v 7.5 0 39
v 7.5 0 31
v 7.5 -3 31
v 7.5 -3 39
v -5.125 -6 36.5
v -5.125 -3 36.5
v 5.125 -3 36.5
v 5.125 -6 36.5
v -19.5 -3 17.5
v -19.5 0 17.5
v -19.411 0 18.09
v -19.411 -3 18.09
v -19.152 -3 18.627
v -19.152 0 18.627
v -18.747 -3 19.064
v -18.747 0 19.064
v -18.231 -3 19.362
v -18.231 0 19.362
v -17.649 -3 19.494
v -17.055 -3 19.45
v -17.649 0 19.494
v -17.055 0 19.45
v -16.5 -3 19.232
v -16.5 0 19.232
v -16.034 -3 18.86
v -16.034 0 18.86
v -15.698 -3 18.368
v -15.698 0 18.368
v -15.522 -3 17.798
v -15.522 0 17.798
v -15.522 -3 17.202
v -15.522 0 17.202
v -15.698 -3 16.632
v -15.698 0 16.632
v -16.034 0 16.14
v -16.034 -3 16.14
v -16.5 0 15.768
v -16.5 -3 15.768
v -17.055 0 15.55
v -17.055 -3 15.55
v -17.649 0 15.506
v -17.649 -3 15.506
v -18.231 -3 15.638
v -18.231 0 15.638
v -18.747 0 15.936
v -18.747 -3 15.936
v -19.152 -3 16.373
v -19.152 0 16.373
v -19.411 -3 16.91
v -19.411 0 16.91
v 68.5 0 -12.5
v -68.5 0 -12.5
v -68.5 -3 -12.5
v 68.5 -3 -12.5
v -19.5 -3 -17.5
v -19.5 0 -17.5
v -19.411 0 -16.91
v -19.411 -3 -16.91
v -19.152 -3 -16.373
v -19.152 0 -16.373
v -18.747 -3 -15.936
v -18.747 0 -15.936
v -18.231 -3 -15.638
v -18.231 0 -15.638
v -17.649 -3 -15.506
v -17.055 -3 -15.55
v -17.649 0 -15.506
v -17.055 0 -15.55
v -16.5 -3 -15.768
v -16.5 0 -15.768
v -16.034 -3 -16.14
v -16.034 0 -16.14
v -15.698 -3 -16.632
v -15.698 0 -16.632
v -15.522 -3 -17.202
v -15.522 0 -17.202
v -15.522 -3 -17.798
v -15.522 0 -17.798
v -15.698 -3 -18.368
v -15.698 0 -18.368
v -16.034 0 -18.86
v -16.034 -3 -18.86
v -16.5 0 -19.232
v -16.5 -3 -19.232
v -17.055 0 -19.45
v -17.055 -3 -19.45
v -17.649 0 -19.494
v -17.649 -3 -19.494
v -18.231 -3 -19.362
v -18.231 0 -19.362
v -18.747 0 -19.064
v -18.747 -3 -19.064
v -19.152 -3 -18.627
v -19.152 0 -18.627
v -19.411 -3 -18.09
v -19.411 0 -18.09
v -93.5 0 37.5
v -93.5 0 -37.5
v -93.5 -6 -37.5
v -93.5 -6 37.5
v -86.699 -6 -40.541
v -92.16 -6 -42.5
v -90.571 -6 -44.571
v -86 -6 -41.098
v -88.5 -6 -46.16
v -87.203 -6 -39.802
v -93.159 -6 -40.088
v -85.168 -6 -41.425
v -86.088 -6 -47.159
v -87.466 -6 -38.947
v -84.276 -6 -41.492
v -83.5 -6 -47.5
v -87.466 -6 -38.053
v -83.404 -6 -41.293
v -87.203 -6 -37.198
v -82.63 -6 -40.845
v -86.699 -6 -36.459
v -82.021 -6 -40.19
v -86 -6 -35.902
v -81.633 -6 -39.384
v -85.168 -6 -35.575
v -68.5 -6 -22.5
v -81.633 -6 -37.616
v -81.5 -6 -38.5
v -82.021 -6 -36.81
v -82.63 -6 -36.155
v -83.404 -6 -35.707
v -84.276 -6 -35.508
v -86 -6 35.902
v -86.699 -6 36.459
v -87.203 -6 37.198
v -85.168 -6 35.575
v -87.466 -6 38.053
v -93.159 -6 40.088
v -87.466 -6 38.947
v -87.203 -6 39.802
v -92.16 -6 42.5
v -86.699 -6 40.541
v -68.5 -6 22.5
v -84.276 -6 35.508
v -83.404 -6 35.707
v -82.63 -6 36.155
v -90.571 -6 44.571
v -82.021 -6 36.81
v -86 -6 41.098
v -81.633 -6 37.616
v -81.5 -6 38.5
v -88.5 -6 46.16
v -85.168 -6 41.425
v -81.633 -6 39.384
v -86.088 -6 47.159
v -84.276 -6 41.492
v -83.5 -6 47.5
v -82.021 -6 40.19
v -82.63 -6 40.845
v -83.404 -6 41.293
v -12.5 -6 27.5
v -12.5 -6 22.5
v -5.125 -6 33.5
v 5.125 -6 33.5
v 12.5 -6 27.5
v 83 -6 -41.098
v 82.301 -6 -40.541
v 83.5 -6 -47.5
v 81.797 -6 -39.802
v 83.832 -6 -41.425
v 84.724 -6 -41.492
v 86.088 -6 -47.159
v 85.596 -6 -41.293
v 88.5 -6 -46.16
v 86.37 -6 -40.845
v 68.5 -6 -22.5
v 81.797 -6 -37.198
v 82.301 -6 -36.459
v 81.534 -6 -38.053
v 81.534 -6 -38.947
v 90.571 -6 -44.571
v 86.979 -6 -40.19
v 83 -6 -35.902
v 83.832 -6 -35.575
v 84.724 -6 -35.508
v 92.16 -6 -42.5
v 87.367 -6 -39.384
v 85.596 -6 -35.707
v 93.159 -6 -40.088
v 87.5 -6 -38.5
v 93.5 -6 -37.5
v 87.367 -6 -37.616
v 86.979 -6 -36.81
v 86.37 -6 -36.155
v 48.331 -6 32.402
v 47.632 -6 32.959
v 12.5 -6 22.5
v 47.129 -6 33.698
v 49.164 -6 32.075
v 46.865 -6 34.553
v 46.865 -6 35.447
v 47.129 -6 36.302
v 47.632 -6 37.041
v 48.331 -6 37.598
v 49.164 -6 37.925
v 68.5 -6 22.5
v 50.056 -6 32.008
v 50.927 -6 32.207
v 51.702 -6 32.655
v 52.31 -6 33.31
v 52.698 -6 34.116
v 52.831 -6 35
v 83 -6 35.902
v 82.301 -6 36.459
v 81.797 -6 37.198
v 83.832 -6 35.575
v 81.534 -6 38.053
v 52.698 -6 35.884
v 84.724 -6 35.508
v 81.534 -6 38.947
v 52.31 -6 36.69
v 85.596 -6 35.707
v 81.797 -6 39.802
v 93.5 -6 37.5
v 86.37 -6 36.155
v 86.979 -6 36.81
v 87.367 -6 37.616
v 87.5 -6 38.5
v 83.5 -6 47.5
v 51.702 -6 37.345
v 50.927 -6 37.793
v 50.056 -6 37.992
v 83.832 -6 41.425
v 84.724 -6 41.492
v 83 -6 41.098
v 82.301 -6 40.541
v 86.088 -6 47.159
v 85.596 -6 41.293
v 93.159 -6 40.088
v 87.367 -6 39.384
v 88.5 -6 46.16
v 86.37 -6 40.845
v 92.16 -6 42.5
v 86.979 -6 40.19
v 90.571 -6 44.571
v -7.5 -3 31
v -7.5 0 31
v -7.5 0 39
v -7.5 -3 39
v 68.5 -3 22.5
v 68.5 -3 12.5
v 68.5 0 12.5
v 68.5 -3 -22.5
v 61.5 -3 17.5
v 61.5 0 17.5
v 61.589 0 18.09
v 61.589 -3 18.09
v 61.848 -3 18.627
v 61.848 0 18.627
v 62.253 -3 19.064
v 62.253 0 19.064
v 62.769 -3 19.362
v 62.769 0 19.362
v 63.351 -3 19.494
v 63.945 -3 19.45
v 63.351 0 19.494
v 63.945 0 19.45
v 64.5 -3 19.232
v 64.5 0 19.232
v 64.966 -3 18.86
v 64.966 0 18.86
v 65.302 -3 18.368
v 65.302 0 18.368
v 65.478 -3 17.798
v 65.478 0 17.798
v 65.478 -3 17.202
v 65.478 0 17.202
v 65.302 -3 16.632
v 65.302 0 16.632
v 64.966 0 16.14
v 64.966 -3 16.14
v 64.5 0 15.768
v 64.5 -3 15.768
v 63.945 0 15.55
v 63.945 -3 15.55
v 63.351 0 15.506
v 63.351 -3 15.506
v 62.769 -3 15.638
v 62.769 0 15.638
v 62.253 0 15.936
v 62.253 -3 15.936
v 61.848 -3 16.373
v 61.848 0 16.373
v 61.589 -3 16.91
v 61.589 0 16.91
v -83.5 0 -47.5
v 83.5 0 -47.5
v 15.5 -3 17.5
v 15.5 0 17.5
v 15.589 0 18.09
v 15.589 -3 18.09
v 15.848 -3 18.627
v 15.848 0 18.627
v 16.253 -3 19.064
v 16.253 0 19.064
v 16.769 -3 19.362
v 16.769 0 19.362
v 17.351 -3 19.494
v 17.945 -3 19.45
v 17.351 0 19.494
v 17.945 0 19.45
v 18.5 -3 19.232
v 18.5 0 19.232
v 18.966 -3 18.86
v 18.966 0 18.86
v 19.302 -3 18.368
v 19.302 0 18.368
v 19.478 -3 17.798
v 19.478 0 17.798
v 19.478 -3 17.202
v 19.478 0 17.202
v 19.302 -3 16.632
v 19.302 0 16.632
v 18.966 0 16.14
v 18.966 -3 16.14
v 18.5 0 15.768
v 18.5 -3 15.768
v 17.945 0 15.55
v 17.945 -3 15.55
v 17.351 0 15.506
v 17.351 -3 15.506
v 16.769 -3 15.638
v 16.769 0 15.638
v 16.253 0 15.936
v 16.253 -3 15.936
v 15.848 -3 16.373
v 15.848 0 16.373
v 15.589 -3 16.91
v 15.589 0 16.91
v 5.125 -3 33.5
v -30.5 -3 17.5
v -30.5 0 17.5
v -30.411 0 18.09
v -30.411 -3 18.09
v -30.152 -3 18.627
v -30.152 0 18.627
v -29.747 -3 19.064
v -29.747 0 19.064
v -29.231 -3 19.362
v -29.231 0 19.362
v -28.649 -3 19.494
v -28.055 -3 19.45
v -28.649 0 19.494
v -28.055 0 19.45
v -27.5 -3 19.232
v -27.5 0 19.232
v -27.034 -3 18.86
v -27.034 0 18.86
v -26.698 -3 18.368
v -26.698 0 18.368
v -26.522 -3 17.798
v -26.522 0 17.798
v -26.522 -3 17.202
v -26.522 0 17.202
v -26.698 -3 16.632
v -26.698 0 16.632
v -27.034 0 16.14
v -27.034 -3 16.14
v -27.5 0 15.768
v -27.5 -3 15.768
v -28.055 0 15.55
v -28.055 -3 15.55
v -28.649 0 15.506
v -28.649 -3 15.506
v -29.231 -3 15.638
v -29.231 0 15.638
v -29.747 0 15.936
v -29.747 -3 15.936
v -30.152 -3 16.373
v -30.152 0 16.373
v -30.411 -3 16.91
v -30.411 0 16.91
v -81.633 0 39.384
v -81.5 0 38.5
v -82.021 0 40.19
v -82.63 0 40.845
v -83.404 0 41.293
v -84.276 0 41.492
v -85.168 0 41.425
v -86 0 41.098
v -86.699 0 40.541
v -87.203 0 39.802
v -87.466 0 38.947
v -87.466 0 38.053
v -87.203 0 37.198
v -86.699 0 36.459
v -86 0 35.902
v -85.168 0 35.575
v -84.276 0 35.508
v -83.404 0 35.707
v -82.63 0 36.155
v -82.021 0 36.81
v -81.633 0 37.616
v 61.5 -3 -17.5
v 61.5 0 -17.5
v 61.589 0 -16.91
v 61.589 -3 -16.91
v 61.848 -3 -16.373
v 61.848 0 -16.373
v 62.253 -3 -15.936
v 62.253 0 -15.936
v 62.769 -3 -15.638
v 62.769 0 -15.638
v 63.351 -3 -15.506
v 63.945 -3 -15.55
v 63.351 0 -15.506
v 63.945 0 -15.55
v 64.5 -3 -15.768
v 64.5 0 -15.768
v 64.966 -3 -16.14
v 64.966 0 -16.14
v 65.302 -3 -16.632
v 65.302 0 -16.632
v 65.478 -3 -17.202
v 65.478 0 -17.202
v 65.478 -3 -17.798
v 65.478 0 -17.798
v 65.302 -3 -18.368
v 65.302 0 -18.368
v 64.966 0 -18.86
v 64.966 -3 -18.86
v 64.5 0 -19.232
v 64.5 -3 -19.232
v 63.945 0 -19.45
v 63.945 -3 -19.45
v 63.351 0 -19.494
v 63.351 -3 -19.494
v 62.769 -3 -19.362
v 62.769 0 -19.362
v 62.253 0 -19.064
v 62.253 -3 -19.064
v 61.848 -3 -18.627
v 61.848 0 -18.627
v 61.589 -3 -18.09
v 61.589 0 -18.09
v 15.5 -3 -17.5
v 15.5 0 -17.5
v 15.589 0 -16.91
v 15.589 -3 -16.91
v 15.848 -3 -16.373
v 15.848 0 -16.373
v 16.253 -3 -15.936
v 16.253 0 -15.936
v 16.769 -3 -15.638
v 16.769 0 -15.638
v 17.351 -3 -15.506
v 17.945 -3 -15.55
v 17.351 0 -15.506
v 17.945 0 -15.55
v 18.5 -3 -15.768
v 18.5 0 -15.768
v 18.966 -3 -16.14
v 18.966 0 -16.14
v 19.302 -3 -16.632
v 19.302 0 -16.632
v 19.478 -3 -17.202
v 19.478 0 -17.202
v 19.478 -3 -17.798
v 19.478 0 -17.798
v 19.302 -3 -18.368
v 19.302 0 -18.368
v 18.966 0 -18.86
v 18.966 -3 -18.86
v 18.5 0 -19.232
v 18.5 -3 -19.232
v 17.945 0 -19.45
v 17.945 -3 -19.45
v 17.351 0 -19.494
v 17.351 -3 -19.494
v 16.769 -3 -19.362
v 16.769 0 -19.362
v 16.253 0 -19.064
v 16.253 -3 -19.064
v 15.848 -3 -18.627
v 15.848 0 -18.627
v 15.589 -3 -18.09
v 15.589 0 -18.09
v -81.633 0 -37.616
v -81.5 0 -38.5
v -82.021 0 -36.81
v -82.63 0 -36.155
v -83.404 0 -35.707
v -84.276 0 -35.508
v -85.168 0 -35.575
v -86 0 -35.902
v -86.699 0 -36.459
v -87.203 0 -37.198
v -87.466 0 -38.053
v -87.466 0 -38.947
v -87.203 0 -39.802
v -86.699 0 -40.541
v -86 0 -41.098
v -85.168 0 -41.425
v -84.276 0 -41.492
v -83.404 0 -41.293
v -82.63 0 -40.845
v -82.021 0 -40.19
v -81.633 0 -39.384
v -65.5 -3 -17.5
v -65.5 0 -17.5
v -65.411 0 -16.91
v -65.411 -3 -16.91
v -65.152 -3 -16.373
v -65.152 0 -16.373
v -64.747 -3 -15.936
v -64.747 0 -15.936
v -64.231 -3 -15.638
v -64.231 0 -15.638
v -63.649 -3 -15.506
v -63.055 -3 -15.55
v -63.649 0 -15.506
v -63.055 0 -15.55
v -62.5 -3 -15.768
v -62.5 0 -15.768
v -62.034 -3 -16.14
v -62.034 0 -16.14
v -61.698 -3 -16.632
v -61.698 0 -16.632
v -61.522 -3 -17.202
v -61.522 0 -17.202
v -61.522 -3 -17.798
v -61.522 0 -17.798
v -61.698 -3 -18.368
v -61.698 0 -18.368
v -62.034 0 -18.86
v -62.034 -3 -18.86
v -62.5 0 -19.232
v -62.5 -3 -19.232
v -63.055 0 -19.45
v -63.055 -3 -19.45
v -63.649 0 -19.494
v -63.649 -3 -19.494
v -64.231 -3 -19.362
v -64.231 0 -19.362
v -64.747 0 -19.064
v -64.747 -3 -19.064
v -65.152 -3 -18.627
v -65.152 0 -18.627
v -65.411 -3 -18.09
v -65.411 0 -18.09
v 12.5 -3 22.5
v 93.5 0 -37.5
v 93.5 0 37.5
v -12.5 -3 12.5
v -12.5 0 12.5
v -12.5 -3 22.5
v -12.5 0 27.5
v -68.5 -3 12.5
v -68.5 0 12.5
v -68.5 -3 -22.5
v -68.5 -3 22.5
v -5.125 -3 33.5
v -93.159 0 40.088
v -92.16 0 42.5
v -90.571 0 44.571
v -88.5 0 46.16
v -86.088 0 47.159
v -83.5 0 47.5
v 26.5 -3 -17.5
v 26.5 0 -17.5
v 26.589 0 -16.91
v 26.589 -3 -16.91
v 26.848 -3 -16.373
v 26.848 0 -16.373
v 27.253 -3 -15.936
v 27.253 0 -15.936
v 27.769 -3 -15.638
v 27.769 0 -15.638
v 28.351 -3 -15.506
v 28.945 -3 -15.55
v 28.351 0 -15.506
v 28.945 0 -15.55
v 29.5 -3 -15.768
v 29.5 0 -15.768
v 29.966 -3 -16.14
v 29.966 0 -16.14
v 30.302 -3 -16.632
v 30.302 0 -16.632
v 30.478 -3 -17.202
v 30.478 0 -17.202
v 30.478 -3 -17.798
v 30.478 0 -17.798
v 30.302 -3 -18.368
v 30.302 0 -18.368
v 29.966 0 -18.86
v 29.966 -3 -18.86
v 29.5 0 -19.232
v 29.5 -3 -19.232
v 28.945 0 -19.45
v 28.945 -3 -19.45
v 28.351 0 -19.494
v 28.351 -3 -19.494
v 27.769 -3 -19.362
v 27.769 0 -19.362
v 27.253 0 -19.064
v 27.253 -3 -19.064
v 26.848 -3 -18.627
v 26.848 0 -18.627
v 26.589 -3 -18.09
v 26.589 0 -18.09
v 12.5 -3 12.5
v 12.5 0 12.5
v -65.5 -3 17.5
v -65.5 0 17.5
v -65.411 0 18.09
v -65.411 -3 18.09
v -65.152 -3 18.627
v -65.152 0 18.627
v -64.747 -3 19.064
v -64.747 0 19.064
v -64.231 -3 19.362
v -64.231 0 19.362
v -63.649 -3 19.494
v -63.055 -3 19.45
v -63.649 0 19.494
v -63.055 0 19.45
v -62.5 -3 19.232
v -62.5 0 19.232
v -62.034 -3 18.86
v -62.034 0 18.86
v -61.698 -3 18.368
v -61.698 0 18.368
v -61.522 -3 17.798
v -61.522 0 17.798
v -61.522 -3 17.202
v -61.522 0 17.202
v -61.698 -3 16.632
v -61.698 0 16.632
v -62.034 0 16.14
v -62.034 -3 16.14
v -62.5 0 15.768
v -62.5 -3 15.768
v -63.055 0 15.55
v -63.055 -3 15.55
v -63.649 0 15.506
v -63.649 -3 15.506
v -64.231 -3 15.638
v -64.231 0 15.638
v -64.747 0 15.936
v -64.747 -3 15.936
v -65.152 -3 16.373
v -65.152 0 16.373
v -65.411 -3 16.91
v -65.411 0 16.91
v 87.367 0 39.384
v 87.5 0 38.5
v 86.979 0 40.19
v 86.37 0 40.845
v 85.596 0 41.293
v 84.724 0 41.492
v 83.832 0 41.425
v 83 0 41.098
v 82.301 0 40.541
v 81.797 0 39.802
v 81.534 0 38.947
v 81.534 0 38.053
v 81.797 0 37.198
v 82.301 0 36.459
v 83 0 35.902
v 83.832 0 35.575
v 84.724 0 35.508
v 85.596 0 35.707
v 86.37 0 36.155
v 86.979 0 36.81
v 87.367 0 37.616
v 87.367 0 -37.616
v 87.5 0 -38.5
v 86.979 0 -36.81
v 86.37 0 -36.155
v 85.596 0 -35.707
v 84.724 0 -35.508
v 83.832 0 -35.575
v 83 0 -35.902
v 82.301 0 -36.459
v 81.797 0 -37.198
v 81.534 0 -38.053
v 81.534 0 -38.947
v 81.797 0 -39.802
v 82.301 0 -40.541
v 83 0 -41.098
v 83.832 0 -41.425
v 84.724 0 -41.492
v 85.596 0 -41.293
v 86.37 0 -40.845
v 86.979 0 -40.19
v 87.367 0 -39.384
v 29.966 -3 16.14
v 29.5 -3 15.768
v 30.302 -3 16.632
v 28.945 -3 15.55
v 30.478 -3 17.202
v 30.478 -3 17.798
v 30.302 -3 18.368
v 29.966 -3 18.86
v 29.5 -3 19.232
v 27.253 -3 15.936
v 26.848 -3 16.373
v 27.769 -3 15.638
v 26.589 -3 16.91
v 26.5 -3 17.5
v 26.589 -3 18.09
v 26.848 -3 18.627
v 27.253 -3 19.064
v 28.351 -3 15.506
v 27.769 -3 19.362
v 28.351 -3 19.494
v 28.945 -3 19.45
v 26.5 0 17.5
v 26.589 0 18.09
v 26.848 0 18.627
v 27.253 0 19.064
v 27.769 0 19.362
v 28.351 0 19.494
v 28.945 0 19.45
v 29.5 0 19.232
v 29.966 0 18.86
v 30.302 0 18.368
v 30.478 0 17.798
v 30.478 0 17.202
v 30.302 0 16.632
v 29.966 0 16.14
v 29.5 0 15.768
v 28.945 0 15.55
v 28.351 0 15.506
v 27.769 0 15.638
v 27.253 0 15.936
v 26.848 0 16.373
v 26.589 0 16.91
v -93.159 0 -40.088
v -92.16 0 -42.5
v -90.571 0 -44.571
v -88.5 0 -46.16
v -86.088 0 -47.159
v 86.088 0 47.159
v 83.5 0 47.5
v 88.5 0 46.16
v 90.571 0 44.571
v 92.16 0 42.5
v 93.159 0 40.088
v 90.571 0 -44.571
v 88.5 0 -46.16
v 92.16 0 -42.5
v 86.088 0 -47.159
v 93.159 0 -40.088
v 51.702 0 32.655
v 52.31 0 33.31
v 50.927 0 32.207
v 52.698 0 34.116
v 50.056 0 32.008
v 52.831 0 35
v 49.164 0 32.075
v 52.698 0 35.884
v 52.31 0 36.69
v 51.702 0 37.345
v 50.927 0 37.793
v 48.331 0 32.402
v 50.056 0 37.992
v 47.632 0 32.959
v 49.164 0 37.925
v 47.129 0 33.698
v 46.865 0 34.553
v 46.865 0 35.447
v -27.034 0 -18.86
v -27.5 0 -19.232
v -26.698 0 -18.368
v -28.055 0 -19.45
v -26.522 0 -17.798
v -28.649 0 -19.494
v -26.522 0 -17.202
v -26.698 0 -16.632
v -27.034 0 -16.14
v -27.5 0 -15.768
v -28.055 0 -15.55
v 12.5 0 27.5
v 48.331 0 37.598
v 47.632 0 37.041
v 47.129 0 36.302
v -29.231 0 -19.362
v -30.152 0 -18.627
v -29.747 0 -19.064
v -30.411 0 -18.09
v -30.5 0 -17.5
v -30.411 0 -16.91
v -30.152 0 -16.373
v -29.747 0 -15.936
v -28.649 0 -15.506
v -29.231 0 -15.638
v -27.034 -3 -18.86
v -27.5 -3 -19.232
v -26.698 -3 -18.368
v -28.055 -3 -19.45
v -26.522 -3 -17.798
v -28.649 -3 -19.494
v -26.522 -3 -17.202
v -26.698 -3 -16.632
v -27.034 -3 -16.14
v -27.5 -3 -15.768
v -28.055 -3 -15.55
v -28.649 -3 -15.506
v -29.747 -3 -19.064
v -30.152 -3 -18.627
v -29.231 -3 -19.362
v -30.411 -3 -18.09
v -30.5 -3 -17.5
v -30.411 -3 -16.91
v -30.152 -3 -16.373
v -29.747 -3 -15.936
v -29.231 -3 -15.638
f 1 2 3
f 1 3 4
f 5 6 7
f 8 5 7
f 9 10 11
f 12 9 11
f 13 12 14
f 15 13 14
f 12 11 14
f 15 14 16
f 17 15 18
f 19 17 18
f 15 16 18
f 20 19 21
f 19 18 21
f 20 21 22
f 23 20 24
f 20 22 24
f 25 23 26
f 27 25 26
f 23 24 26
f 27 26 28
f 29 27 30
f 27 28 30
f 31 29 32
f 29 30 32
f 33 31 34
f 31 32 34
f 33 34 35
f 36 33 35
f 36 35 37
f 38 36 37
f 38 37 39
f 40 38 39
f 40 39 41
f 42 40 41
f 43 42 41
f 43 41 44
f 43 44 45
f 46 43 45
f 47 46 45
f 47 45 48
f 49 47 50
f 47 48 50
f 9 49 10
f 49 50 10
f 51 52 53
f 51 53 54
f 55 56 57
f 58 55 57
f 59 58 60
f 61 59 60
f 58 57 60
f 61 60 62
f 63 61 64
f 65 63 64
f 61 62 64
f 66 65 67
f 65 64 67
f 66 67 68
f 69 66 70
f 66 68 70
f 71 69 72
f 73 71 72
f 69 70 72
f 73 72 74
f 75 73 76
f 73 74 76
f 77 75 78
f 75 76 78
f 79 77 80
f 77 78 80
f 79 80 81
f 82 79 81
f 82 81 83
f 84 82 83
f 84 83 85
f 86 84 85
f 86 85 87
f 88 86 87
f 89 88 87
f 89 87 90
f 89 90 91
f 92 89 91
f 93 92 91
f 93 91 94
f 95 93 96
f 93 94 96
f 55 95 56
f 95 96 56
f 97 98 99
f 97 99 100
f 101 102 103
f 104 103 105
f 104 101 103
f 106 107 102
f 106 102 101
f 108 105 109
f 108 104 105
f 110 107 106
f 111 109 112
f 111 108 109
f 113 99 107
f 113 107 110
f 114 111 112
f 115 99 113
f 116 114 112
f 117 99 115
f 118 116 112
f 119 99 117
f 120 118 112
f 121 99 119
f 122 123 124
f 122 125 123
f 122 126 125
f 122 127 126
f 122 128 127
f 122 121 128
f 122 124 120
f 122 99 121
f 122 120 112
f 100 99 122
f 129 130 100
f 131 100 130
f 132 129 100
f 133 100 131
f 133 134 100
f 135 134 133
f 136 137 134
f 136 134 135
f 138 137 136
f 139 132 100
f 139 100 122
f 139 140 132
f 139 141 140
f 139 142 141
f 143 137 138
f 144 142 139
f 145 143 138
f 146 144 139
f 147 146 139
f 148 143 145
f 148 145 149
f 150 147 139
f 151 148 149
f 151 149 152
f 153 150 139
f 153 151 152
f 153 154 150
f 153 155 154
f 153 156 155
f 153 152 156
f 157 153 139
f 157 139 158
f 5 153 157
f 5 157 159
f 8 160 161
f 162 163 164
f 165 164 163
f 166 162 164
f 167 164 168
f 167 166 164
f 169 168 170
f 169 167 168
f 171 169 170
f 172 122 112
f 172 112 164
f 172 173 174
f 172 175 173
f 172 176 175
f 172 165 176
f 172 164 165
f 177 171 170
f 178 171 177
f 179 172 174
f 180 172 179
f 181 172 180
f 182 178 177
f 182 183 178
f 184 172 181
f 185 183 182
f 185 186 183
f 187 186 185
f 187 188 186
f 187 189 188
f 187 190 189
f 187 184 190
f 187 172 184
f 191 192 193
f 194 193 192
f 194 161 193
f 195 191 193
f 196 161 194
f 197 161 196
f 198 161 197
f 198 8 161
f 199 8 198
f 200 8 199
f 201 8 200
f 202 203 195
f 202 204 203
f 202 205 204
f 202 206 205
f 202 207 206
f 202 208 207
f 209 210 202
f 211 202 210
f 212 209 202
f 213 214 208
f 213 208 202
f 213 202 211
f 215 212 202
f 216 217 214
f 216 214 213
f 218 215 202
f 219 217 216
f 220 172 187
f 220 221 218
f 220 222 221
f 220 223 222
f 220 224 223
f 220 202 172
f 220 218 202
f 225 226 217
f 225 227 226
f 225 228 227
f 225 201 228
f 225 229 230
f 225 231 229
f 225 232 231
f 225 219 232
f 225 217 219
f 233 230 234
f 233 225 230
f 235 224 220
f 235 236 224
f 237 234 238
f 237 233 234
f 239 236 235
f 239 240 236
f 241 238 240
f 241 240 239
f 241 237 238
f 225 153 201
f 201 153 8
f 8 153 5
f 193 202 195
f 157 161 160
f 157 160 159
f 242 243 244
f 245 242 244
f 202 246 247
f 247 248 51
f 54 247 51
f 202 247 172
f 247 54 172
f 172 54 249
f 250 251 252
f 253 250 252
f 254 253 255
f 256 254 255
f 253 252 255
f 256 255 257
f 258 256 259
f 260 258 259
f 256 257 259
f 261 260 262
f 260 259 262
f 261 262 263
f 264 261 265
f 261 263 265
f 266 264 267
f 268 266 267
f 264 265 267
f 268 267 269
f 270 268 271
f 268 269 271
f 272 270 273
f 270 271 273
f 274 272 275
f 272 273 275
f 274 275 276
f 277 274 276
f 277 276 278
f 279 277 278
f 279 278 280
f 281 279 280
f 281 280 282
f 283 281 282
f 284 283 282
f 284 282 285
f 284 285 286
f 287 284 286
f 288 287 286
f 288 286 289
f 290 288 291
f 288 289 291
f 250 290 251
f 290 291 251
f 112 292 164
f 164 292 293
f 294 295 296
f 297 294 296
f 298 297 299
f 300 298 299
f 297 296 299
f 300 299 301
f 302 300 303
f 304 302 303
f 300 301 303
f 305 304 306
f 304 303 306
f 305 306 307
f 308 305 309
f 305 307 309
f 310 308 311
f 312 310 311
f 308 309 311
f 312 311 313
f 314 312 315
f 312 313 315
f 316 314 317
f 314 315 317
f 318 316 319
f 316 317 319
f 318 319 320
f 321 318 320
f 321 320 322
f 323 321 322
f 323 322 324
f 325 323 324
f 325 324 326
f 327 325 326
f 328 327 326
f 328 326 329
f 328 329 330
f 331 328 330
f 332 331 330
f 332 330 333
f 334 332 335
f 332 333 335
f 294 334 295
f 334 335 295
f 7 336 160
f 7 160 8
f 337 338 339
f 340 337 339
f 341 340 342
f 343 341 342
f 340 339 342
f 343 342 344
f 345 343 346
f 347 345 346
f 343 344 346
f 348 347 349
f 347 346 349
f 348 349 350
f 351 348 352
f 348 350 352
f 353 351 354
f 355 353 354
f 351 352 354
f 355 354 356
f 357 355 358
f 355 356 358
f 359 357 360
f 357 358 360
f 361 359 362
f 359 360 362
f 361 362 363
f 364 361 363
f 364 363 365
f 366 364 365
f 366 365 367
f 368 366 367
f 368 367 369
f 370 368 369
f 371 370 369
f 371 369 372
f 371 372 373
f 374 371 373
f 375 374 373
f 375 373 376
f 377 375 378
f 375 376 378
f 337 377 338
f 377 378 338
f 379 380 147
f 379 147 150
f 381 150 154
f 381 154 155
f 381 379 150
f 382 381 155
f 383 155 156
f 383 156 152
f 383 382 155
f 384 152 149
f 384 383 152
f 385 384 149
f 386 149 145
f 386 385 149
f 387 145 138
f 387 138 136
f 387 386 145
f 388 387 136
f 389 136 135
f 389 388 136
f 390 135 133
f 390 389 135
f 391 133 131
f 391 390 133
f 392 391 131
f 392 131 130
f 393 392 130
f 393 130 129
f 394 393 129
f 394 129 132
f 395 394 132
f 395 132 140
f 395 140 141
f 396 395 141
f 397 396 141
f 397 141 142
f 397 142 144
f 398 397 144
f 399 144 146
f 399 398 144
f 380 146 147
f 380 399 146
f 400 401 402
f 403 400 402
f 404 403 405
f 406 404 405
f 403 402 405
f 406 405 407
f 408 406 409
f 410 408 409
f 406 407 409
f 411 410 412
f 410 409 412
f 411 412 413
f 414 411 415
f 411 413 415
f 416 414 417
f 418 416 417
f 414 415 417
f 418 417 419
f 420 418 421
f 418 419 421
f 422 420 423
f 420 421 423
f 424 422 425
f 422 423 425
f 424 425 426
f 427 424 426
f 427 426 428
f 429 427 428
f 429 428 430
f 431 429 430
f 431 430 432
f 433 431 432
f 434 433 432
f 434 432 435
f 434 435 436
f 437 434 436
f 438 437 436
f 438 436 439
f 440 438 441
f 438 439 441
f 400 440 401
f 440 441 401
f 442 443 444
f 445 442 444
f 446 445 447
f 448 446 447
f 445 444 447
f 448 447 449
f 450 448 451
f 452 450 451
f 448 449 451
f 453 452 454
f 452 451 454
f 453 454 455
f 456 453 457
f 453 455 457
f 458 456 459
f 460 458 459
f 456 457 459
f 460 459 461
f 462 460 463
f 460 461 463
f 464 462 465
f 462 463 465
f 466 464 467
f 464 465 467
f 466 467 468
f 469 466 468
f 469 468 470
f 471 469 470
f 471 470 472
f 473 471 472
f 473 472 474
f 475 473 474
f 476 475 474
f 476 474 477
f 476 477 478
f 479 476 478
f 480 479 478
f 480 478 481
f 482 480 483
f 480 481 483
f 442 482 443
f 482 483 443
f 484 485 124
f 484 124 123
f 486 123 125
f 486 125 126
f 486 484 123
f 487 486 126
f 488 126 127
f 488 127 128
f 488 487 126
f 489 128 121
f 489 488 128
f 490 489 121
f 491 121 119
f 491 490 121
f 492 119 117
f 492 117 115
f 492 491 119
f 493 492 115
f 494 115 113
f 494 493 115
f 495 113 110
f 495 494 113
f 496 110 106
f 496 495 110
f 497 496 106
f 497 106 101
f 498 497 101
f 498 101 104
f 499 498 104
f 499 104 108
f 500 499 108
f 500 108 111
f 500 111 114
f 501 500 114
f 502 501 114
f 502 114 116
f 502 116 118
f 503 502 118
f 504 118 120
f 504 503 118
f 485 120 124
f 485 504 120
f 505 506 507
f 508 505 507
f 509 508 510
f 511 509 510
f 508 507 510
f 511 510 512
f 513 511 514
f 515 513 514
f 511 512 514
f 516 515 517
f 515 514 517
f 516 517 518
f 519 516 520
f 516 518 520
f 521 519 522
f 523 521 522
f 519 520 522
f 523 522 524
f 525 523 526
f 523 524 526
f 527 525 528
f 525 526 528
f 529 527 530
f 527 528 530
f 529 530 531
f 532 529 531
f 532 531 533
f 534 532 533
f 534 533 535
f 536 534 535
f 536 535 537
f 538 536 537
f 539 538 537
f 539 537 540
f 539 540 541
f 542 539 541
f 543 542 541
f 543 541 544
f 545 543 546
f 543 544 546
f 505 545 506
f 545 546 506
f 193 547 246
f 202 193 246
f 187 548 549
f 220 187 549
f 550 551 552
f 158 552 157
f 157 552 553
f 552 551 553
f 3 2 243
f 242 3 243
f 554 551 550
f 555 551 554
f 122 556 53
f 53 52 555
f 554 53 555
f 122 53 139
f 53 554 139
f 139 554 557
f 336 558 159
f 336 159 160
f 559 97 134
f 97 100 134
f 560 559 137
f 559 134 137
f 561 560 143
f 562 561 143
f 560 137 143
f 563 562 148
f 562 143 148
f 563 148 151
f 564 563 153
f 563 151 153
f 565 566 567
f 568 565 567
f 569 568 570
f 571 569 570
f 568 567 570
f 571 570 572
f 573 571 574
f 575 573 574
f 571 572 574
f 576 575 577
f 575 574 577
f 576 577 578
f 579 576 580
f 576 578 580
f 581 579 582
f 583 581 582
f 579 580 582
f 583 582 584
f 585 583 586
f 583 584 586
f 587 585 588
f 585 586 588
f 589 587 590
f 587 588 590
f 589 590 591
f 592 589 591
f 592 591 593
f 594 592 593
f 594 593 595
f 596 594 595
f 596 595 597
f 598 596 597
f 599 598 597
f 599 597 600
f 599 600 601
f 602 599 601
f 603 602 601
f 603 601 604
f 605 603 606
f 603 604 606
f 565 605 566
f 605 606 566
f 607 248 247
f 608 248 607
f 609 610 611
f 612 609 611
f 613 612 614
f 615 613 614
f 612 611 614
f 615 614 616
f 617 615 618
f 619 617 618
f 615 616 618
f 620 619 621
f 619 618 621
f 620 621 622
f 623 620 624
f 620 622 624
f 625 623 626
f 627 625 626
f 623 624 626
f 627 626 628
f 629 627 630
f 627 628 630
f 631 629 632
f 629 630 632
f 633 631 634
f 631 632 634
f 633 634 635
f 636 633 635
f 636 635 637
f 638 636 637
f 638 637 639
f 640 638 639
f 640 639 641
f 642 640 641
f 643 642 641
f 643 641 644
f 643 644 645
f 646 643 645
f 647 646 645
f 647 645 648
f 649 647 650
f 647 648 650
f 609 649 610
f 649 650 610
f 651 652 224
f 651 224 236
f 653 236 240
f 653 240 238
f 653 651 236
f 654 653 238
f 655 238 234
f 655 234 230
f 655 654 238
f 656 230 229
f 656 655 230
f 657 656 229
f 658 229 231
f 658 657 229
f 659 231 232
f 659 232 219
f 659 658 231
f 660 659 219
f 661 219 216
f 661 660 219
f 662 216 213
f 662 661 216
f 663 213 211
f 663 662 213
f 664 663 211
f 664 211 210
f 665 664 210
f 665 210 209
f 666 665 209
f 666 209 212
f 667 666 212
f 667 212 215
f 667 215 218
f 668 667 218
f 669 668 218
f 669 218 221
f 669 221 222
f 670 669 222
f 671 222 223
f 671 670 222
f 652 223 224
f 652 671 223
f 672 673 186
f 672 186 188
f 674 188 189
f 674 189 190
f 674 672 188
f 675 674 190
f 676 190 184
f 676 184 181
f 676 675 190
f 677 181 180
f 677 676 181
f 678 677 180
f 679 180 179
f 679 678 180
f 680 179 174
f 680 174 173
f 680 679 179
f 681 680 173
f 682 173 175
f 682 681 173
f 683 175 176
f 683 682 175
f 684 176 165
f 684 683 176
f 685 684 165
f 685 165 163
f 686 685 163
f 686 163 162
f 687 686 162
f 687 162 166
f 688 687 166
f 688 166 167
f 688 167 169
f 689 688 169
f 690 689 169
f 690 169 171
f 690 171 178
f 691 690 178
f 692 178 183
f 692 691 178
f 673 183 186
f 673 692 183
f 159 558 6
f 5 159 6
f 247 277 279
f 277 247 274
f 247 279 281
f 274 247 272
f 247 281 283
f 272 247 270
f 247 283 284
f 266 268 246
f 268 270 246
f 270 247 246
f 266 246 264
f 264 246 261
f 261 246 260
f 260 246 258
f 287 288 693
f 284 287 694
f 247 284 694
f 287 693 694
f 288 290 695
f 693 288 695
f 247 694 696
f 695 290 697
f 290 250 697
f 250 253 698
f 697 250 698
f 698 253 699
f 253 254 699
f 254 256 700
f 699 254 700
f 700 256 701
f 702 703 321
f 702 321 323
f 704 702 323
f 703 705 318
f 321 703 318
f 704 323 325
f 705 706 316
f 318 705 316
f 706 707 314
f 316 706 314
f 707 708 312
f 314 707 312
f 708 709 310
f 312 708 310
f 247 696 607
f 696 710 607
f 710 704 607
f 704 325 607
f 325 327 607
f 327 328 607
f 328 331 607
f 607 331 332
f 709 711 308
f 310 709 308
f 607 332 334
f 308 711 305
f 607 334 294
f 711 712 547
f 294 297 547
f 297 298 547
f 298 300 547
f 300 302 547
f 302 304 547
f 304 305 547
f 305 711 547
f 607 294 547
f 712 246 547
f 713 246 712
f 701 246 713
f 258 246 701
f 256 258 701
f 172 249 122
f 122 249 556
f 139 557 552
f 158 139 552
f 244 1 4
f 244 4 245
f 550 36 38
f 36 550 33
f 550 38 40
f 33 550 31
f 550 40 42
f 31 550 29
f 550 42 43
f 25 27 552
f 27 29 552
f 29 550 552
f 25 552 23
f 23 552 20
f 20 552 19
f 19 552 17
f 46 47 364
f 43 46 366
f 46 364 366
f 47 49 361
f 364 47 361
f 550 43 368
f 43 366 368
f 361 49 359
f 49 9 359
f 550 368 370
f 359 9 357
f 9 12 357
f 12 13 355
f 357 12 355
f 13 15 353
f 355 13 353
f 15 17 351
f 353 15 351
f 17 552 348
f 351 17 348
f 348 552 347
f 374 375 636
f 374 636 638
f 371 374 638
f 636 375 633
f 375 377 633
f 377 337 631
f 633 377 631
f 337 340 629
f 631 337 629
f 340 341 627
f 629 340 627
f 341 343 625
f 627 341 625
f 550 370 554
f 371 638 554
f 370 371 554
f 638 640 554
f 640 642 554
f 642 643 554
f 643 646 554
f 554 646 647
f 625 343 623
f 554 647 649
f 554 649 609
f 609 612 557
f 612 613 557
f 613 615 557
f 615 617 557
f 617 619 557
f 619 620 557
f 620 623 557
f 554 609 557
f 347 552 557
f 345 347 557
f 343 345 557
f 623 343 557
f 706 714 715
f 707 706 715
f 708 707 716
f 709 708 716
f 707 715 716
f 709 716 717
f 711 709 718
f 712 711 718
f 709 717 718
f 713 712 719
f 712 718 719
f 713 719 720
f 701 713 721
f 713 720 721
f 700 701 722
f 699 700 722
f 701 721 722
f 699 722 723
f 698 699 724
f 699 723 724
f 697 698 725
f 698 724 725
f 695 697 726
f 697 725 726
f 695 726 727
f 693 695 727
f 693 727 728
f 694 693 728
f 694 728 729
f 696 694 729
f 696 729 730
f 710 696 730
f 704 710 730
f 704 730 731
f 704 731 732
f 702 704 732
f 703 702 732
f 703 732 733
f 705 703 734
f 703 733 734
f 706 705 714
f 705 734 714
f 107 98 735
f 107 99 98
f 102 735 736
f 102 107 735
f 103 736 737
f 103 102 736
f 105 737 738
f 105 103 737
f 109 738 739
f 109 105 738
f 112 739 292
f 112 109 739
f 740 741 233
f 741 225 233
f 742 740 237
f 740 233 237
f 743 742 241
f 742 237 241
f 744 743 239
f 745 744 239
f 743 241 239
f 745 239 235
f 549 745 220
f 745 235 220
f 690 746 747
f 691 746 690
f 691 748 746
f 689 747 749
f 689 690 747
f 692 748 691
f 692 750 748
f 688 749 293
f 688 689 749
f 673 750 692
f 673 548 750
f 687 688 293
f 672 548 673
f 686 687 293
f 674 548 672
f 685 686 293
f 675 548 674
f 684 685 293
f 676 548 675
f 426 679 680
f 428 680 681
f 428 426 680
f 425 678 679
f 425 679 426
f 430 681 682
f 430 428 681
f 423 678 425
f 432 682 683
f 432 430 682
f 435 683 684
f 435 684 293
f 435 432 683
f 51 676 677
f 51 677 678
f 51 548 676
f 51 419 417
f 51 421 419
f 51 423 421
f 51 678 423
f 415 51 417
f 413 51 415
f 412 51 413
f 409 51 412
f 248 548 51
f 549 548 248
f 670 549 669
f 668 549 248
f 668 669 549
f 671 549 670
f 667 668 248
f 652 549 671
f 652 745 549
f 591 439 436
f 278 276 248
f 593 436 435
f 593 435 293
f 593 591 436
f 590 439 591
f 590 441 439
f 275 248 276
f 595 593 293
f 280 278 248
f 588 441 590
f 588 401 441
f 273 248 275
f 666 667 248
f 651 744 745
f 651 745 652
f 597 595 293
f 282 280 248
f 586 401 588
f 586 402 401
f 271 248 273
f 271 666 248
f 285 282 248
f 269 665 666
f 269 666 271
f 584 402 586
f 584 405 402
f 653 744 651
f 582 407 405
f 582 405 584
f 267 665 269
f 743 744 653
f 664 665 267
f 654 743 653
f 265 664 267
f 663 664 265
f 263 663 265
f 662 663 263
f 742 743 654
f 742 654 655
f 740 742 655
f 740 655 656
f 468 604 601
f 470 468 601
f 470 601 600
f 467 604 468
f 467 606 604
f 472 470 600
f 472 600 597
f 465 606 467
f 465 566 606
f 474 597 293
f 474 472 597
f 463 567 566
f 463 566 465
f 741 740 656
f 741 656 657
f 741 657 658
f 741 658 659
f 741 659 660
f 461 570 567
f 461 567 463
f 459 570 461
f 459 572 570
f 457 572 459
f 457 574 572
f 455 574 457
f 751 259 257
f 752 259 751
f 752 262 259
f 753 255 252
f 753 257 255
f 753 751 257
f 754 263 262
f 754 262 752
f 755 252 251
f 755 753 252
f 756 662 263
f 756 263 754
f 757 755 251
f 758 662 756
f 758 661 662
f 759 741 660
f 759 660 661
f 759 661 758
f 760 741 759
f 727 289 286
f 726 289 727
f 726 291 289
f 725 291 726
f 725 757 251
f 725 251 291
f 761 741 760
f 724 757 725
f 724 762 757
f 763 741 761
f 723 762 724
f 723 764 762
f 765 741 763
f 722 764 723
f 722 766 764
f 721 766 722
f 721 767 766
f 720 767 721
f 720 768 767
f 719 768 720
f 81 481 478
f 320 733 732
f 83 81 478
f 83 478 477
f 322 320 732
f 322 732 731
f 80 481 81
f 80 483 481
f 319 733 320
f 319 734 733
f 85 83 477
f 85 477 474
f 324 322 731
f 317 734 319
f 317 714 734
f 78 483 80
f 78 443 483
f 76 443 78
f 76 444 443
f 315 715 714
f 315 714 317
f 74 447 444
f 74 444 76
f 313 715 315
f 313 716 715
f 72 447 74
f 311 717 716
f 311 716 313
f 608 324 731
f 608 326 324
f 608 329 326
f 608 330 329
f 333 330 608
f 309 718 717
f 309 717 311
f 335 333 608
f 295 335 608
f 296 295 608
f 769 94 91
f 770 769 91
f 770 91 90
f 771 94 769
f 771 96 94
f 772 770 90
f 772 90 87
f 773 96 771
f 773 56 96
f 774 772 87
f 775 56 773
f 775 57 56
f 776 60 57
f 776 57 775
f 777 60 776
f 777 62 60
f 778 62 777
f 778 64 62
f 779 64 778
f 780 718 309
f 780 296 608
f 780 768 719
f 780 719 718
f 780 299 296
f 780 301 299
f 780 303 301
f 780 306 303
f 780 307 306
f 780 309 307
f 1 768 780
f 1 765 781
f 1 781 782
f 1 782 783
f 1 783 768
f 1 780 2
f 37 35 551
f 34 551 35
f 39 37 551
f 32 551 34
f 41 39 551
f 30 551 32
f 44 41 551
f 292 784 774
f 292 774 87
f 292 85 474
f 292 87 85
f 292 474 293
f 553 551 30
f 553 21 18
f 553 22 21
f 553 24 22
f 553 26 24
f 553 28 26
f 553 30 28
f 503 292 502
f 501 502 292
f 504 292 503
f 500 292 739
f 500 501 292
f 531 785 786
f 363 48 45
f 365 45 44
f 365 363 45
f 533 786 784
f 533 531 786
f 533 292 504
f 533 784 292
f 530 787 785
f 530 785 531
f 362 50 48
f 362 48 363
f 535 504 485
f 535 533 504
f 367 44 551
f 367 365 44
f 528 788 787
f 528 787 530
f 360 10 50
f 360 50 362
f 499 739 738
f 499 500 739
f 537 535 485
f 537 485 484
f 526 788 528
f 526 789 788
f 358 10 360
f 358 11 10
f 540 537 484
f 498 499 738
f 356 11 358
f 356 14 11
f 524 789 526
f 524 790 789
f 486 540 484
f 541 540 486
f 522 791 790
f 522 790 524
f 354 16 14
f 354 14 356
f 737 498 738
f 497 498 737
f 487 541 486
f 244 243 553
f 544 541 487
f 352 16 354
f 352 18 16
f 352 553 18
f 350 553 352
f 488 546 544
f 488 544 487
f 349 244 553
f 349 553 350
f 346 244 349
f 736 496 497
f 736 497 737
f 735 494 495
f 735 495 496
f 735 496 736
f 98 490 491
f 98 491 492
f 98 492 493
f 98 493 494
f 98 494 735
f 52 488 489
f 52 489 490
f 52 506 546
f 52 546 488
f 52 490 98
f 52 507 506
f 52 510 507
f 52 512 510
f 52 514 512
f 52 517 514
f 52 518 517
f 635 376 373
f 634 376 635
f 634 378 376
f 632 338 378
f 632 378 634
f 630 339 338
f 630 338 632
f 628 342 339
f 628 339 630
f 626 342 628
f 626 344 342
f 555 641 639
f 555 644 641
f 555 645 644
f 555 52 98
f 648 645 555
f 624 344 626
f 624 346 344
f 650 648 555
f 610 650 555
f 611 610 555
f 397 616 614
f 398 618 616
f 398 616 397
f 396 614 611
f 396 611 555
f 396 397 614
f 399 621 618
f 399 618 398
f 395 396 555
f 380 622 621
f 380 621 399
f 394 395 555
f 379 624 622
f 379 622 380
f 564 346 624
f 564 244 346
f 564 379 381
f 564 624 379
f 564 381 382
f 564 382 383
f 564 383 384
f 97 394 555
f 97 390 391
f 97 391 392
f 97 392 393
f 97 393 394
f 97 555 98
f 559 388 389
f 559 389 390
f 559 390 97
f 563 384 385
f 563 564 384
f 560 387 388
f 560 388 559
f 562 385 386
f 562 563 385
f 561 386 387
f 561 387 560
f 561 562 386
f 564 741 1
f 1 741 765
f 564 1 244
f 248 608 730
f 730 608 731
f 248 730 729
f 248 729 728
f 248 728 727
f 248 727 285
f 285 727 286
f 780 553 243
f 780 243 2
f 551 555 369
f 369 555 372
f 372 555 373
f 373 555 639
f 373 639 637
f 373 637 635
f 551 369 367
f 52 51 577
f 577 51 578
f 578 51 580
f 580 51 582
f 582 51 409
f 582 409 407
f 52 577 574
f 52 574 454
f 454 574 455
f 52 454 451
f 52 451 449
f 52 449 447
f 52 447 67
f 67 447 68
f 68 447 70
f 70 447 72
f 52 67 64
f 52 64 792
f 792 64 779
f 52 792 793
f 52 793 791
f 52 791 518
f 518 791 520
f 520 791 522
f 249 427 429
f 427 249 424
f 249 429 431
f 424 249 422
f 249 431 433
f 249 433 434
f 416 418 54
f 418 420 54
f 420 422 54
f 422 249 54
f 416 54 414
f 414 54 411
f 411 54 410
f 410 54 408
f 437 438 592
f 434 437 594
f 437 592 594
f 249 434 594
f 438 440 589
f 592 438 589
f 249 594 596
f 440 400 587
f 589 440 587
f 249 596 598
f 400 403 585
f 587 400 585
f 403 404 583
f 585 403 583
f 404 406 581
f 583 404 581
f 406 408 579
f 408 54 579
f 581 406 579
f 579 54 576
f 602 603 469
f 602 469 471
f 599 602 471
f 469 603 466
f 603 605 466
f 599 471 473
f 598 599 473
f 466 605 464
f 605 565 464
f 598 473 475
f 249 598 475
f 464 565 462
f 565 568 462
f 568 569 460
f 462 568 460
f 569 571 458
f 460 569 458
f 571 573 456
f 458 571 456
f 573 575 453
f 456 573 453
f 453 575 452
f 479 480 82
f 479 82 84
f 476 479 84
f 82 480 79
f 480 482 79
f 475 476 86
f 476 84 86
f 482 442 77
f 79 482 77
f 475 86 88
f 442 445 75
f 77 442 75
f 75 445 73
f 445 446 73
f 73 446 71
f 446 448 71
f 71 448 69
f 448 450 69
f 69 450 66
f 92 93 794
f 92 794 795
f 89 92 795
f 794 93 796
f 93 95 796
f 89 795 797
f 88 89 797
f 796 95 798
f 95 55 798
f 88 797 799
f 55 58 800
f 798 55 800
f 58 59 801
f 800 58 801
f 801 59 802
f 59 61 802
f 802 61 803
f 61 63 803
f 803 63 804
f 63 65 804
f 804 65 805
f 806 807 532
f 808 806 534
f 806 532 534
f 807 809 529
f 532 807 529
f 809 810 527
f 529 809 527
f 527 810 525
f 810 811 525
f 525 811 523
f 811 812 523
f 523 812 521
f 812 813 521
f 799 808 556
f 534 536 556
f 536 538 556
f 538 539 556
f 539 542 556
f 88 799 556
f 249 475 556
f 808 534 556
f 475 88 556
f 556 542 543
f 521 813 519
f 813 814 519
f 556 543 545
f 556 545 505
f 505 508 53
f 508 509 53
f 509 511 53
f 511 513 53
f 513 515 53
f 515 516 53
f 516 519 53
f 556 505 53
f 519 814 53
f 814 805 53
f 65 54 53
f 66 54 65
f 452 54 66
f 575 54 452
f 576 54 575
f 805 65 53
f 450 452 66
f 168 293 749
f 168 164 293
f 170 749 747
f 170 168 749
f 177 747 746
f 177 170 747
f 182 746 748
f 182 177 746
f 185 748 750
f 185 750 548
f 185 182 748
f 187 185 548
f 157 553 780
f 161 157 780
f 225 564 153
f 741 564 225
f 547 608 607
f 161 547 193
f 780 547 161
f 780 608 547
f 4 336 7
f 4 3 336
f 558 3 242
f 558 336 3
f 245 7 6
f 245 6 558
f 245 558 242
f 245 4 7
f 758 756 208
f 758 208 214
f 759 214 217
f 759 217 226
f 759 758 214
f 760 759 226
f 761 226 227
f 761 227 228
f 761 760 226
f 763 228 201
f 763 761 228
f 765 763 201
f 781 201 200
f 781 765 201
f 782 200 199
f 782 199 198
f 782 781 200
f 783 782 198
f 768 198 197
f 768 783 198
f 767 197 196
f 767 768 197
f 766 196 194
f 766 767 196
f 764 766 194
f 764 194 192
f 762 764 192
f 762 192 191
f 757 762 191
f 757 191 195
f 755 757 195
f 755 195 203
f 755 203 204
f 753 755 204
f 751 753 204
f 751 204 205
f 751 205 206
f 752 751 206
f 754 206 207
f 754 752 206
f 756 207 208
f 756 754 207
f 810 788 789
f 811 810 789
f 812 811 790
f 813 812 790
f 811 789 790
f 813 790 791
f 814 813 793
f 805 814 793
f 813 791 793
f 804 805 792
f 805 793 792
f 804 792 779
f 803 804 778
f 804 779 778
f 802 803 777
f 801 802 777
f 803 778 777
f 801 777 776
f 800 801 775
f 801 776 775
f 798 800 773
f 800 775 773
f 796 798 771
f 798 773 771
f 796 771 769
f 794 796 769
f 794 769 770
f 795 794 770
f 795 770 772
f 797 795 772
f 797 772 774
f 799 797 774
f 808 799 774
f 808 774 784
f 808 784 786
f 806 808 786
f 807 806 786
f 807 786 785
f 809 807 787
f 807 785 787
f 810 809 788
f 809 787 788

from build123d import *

# Parameters (mm, degrees)
F0_W     = 187
F0_H     = 95
F0_R     = 3
F0_W_2   = 10.25
F0_H_2   = 3
F1_DEPTH = 6
F2_R     = 10
F3_W     = 15
F3_H     = 8
F4_DEPTH = 3
F5_R     = 2
F6_DEPTH = 3


with BuildPart() as f1:
    # F0 (on Front) → F1 (new body)
    with BuildSketch(Plane.XZ):
        Rectangle(F0_W, F0_H)
        with Locations((-84.5, -38.5)):
            Circle(F0_R, mode=Mode.SUBTRACT)
        with Locations((84.5, -38.5)):
            Circle(F0_R, mode=Mode.SUBTRACT)
        Polygon((12.5, 22.5), (68.5, 22.5), (68.5, -22.5), (-68.5, -22.5), (-68.5, 22.5), (-12.5, 22.5), (-12.5, 27.5), (12.5, 27.5), align=None, mode=Mode.SUBTRACT)
        with Locations((-84.5, 38.5)):
            Circle(F0_R, mode=Mode.SUBTRACT)
        with Locations((0, 35)):
            Rectangle(F0_W_2, F0_H_2, mode=Mode.SUBTRACT)
        with Locations((49.831439, 35)):
            Circle(F0_R, mode=Mode.SUBTRACT)
        with Locations((84.5, 38.5)):
            Circle(F0_R, mode=Mode.SUBTRACT)
    extrude(amount=F1_DEPTH)

    # F2
    f2_edges = [f1.edges().sort_by_distance(p)[0] for p in [
        (93.5, -3, -47.5),
        (-93.5, -3, -47.5),
        (-93.5, -3, 47.5),
        (93.5, -3, 47.5),
    ]]
    fillet(f2_edges, radius=F2_R)

    # F3 (on face) → F4 (cut)
    with BuildSketch(Plane(origin=(0, 0, 0), x_dir=(-1, 0, 0), z_dir=(0, 1, 0))):
        with Locations((0, 35)):
            Rectangle(F3_W, F3_H)
    extrude(amount=-F4_DEPTH, mode=Mode.SUBTRACT)

    # F5 (on face) → F6 (join)
    with BuildSketch(Plane(origin=(0, 0, 0), x_dir=(-1, 0, 0), z_dir=(0, 1, 0))):
        Polygon((-12.5, 12.5), (-12.5, 22.5), (-12.5, 27.5), (-75.93517, 27.851377), (-75.93517, 12.5), (-68.5, 12.5), align=None)
        with Locations((-63.5, 17.5)):
            Circle(F5_R, mode=Mode.SUBTRACT)
        with Locations((-28.5, 17.5)):
            Circle(F5_R, mode=Mode.SUBTRACT)
        with Locations((-17.5, 17.5)):
            Circle(F5_R, mode=Mode.SUBTRACT)
        Polygon((71.986005, 27.851377), (12.5, 22.5), (12.5, 12.5), (71.986005, 12.5), align=None)
        with Locations((17.5, 17.5)):
            Circle(F5_R, mode=Mode.SUBTRACT)
        with Locations((28.5, 17.5)):
            Circle(F5_R, mode=Mode.SUBTRACT)
        with Locations((63.5, 17.5)):
            Circle(F5_R, mode=Mode.SUBTRACT)
        Polygon((72.550595, -12.5), (-68.5, -12.5), (-73.253393, -11.935415), (-76.499753, -24.073985), (72.550595, -24.073985), align=None)
        with Locations((-63.5, -17.5)):
            Circle(F5_R, mode=Mode.SUBTRACT)
        with Locations((-28.5, -17.5)):
            Circle(F5_R, mode=Mode.SUBTRACT)
        with Locations((-17.5, -17.5)):
            Circle(F5_R, mode=Mode.SUBTRACT)
        with Locations((17.5, -17.5)):
            Circle(F5_R, mode=Mode.SUBTRACT)
        with Locations((28.5, -17.5)):
            Circle(F5_R, mode=Mode.SUBTRACT)
        with Locations((63.5, -17.5)):
            Circle(F5_R, mode=Mode.SUBTRACT)
    extrude(amount=-F6_DEPTH)


solid = f1.part
